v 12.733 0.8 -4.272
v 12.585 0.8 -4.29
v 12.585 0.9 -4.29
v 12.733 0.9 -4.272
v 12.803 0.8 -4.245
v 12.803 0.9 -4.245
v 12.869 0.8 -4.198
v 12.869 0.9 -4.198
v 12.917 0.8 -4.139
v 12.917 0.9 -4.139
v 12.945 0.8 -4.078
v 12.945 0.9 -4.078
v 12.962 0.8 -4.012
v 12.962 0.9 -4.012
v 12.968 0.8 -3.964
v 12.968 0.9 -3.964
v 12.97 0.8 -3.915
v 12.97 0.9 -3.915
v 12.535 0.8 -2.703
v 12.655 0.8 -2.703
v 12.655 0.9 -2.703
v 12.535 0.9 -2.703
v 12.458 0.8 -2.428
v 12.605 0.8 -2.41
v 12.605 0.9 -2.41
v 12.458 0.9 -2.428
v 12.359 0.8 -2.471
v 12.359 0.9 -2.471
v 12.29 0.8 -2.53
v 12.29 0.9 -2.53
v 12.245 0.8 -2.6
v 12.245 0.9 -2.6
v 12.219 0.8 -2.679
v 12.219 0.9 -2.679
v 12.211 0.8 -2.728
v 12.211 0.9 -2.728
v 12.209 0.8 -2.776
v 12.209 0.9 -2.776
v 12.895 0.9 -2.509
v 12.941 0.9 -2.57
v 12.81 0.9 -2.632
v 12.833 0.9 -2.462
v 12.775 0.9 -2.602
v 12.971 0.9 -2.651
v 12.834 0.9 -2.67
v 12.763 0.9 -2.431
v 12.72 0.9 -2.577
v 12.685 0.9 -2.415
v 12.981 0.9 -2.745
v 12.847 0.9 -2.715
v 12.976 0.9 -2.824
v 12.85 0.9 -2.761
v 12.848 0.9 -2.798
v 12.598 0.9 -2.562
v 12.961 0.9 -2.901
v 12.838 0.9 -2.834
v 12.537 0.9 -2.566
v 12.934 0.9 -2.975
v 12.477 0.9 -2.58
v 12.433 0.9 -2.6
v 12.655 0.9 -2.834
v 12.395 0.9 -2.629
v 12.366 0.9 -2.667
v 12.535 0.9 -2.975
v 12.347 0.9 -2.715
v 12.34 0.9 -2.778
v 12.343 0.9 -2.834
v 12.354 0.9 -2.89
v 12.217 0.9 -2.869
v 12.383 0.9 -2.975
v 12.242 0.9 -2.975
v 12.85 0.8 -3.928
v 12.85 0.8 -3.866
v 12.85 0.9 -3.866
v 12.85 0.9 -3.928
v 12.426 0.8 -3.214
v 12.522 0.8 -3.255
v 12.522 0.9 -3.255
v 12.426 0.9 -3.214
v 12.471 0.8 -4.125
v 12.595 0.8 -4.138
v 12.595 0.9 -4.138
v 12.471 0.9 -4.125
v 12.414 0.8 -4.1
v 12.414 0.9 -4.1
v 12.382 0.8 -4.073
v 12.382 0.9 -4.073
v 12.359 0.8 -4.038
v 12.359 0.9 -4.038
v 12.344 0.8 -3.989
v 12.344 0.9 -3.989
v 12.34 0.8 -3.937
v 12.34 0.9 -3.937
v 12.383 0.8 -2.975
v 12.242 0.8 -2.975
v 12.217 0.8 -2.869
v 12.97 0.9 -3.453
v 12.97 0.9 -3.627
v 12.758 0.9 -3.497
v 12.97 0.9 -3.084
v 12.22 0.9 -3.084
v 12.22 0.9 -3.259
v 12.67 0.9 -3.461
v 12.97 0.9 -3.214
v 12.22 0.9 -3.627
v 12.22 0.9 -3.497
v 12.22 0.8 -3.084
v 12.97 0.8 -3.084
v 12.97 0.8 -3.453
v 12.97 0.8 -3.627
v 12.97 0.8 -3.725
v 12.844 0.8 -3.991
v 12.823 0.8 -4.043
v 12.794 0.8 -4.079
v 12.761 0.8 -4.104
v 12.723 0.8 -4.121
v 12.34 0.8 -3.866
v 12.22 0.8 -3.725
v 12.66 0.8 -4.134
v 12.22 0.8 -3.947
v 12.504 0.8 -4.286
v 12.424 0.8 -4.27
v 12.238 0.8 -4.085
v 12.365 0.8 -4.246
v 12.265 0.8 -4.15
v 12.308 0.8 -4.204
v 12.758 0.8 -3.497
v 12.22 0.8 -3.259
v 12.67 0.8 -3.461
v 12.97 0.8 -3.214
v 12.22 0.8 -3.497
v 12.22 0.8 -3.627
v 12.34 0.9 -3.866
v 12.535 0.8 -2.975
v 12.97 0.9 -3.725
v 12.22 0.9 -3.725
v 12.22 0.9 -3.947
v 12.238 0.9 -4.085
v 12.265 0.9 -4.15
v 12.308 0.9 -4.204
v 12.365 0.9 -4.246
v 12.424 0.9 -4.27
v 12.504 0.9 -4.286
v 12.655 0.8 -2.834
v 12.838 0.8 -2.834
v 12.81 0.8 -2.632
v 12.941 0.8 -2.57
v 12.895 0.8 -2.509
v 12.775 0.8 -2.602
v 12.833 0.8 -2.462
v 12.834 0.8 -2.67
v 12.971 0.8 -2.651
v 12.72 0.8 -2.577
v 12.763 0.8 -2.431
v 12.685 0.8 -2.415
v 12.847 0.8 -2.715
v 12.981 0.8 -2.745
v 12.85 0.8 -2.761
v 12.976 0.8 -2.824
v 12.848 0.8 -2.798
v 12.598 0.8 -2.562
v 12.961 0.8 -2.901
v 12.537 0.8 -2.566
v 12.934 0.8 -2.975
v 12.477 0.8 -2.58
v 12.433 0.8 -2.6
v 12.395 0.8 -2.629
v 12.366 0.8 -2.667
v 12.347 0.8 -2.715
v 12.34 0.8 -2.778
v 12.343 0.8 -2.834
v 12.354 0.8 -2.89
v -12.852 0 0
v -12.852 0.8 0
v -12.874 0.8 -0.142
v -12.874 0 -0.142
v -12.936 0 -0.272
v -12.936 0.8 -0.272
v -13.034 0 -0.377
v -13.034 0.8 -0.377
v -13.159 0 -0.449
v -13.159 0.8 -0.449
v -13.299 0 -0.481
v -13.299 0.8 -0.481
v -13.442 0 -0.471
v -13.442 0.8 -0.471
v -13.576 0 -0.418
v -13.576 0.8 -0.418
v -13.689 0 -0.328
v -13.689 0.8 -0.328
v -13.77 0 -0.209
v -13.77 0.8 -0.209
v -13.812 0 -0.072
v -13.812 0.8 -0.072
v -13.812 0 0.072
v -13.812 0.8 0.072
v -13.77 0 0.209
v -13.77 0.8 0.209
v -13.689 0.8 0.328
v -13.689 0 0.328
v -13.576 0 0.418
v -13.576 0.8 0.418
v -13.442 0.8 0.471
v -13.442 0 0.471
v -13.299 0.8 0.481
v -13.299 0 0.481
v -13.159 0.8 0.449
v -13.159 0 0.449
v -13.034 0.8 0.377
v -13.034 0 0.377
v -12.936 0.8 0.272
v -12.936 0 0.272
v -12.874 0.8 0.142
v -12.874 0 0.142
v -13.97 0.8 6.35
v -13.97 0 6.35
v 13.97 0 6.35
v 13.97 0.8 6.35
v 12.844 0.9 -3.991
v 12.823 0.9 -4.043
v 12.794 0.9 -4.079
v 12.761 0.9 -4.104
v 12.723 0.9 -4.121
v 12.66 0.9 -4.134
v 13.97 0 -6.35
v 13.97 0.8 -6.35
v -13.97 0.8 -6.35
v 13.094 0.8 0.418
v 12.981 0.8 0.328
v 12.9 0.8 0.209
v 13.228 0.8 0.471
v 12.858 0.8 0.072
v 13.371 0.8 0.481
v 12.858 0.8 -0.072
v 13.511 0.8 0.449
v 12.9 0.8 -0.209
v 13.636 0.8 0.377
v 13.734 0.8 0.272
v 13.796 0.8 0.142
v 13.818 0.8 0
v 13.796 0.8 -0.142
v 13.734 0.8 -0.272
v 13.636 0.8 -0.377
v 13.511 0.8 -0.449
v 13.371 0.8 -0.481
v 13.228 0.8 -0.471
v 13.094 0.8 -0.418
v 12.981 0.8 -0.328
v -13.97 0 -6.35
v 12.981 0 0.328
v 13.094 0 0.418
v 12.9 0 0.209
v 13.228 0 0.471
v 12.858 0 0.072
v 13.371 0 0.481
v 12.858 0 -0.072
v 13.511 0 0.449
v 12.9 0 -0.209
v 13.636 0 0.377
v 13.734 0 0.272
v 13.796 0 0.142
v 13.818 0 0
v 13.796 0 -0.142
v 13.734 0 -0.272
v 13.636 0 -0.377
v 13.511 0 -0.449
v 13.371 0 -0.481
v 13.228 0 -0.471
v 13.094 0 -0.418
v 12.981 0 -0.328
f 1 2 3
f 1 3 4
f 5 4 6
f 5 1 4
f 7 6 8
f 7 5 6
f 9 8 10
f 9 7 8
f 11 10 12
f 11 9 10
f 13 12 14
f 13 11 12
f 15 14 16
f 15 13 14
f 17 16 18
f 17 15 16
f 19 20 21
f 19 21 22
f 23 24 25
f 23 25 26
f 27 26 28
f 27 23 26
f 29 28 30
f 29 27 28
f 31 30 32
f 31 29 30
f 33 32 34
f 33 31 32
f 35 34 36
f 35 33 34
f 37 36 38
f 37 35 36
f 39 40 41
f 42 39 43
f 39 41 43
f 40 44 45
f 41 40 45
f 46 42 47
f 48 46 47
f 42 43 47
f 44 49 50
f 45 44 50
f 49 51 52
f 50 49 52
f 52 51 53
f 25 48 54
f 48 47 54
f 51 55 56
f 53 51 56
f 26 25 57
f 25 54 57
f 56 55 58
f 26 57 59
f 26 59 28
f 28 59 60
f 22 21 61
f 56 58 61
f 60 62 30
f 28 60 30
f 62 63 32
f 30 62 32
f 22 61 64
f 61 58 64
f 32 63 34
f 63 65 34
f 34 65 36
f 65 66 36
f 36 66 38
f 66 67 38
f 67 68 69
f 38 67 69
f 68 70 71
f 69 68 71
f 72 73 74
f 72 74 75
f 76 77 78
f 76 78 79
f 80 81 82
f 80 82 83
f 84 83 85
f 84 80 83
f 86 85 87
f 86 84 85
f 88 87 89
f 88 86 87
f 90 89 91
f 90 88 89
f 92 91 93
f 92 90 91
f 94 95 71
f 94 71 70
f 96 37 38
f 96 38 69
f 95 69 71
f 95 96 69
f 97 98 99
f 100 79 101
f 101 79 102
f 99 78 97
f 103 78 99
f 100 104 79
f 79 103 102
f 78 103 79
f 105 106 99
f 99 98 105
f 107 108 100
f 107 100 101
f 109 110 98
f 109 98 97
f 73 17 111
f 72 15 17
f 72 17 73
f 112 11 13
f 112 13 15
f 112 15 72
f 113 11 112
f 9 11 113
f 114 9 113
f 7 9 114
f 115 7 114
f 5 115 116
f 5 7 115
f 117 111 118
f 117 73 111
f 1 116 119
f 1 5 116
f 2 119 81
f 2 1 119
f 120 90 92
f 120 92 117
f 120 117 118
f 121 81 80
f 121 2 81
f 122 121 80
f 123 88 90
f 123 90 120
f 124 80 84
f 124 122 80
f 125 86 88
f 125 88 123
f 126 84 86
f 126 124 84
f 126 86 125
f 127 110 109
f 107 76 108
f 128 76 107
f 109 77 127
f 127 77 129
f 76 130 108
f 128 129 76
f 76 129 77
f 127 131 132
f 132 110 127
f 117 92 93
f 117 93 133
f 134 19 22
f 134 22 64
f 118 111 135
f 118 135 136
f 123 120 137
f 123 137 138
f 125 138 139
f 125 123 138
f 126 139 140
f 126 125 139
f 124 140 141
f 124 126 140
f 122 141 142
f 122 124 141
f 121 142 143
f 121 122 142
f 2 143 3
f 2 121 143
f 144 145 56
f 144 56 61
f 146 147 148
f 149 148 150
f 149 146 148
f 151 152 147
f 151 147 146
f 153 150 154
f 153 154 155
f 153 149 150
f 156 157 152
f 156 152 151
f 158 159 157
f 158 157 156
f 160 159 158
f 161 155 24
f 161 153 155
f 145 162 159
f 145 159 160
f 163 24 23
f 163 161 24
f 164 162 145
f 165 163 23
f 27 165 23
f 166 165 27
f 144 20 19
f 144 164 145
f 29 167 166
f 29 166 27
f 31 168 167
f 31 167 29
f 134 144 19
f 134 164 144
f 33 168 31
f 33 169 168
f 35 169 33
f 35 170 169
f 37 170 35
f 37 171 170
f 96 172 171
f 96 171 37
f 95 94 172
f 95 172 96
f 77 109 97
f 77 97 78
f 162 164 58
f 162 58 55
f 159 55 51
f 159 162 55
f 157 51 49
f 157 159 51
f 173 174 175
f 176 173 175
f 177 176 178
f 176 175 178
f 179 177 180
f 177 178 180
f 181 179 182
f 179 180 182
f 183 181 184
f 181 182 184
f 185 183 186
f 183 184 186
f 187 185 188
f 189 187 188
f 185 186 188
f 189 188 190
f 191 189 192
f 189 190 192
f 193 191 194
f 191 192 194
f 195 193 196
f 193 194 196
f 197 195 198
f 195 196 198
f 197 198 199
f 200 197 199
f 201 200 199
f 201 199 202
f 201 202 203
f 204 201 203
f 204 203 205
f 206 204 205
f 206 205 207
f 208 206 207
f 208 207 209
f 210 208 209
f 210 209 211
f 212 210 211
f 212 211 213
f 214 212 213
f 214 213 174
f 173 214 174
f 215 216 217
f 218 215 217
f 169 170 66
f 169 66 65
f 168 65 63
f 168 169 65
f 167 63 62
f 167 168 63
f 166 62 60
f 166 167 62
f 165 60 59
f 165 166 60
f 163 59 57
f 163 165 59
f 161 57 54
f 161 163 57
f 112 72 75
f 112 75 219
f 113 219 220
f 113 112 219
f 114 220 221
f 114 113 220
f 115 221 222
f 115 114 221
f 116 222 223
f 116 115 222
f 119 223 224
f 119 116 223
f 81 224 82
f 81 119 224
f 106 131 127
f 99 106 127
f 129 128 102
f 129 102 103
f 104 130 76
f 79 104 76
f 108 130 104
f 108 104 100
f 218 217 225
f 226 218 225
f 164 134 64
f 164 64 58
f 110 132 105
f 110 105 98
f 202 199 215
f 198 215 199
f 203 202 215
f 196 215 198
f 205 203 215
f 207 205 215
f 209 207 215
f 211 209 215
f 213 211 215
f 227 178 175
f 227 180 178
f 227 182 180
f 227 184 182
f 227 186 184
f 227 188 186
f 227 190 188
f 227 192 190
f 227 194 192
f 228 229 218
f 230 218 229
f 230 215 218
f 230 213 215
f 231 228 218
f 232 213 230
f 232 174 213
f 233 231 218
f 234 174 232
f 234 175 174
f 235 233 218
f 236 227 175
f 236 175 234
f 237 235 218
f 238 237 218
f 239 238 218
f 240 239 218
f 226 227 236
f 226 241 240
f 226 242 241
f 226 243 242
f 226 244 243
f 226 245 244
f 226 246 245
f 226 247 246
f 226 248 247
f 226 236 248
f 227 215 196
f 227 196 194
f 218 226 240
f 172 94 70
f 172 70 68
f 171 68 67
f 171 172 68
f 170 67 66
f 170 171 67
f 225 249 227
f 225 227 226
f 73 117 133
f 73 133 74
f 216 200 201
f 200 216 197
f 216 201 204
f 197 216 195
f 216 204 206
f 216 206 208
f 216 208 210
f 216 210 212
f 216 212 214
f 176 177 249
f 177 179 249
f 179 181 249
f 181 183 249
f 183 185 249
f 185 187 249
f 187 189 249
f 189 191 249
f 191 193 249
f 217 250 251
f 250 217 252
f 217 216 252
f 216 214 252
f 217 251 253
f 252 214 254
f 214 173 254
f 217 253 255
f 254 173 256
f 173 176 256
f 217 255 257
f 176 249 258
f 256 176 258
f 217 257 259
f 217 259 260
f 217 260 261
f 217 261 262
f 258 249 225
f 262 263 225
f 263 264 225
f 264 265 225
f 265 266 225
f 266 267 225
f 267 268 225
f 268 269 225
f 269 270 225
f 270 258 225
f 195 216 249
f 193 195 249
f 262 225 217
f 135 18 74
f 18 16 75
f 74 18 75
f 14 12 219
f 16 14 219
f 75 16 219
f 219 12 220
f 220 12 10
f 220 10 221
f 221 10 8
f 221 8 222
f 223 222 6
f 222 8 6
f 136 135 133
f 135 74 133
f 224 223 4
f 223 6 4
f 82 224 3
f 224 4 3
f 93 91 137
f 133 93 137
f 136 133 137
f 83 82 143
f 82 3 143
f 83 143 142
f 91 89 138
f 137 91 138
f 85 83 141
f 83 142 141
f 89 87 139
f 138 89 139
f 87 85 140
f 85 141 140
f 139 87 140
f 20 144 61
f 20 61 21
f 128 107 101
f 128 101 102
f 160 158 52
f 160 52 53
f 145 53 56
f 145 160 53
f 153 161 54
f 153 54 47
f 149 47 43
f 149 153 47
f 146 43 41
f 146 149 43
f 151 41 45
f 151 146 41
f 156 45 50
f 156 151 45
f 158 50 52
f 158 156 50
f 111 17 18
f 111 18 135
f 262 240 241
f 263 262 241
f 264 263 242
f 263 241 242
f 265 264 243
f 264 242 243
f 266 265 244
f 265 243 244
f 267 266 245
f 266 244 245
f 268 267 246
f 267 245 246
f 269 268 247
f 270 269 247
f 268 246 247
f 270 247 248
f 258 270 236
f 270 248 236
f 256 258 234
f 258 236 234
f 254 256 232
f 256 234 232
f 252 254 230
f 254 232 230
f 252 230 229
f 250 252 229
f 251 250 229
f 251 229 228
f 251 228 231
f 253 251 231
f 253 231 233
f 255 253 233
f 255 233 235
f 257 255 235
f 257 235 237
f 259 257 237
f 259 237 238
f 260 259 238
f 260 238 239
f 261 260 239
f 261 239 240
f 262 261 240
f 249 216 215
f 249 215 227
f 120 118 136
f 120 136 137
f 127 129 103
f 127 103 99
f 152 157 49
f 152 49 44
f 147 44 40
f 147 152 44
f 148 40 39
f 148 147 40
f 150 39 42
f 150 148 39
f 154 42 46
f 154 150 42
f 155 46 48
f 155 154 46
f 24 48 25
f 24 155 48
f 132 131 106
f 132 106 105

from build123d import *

# Parameters (mm, degrees)
SKETCH1_W             = 27.94
SKETCH1_H             = 12.7
BOSS_EXTRUDE1_DEPTH   = 0.8
BOSS_EXTRUDE3_DEPTH   = 0.1
BOSS_EXTRUDE3_2_DEPTH = 0.1
BOSS_EXTRUDE3_3_DEPTH = 0.1
SKETCH3_R             = 0.4826
CUT_EXTRUDE1_DEPTH    = 1.8


with BuildPart() as part:
    # Sketch1 → Boss-Extrude1 (new body)
    with BuildSketch(Plane(origin=(0, 0, 0), x_dir=(1, 0, 0), z_dir=(0, 1, 0))):
        Rectangle(SKETCH1_W, SKETCH1_H)
    extrude(amount=BOSS_EXTRUDE1_DEPTH)

    # Sketch3 → Cut-Extrude1 (cut, through all)
    with BuildSketch(Plane(origin=(0, 0.8, 0), x_dir=(1, 0, 0), z_dir=(0, 1, 0))):
        with Locations((-13.335, 0)):
            Circle(SKETCH3_R)
        with Locations((13.335, 0)):
            Circle(SKETCH3_R)
    extrude(amount=-CUT_EXTRUDE1_DEPTH, mode=Mode.SUBTRACT)


with BuildPart() as body_2:
    # Sketch2 → Boss-Extrude3 (new body)
    with BuildSketch(Plane(origin=(0, 0.8, 0), x_dir=(1, 0, 0), z_dir=(0, 1, 0))):
        with BuildLine():
            Line((12.654782609, 2.70326087), (12.535217391, 2.70326087))
            Line((12.535217391, 2.70326087), (12.535217391, 2.975))
            Line((12.535217391, 2.975), (12.933994565, 2.975))
            add(Edge.make_bspline(
                [(12.933994565, 2.975), (12.937837468, 2.966382306), (12.945532468, 2.949126304), (12.955152264, 2.922452152), (12.963165662, 2.895161446), (12.969582444, 2.867186739), (12.974756704, 2.838406753), (12.978239832, 2.808457977), (12.980539909, 2.777346131), (12.980758593, 2.756141049), (12.980869565, 2.745380435)],
                knots=[0, 0, 0, 0, 2.83e-05, 5.6667e-05, 8.4989e-05, 0.00011358, 0.000142731, 0.000172666, 0.000203994, 0.00023627, 0.00023627, 0.00023627, 0.00023627], degree=3))
            add(Edge.make_bspline(
                [(12.980869565, 2.745380435), (12.980575135, 2.732686426), (12.980000187, 2.70789819), (12.975544847, 2.671730082), (12.968102985, 2.637534066), (12.95758082, 2.605375869), (12.944174483, 2.57532413), (12.927751506, 2.547537374), (12.908296896, 2.522119124), (12.885871835, 2.499068556), (12.860656623, 2.478365329), (12.832343935, 2.460583289), (12.801398893, 2.444994305), (12.76754561, 2.432119366), (12.730828208, 2.422206945), (12.691431111, 2.414857144), (12.649210662, 2.41069843), (12.620144812, 2.410093731), (12.605190217, 2.409782609)],
                knots=[0, 0, 0, 0, 3.8074e-05, 7.4349e-05, 0.000109129, 0.000142911, 0.000175676, 0.000207657, 0.00023952, 0.000271469, 0.000303936, 0.000337152, 0.000371559, 0.000407737, 0.000445602, 0.000485509, 0.000527842, 0.000572705, 0.000572705, 0.000572705, 0.000572705], degree=3))
            add(Edge.make_bspline(
                [(12.605190217, 2.409782609), (12.590119329, 2.410063379), (12.560640948, 2.410612562), (12.517649028, 2.415264178), (12.477015917, 2.422834197), (12.438924245, 2.433501081), (12.40340077, 2.447069567), (12.37066987, 2.46356367), (12.340664417, 2.482851666), (12.313555861, 2.505027053), (12.289303043, 2.52985676), (12.268264698, 2.557527053), (12.250159996, 2.587749777), (12.235215685, 2.620684853), (12.223466349, 2.656149359), (12.215286825, 2.694073788), (12.210026575, 2.734307056), (12.209434125, 2.761950748), (12.209130435, 2.776120924)],
                knots=[0, 0, 0, 0, 4.5202e-05, 8.8415e-05, 0.000129553, 0.000169072, 0.000206921, 0.000243455, 0.000278834, 0.000313715, 0.000348305, 0.000382716, 0.000417755, 0.00045378, 0.000490999, 0.000529611, 0.000570015, 0.000612508, 0.000612508, 0.000612508, 0.000612508], degree=3))
            add(Edge.make_bspline(
                [(12.209130435, 2.776120924), (12.209532218, 2.793129262), (12.210329498, 2.826879873), (12.217434247, 2.876980037), (12.227746501, 2.9263664), (12.237062955, 2.958747212), (12.24173913, 2.975)],
                knots=[0, 0, 0, 0, 5.0999e-05, 0.0001012, 0.000151531, 0.00020225, 0.00020225, 0.00020225, 0.00020225], degree=3))
            Line((12.24173913, 2.975), (12.383043478, 2.975))
            add(Edge.make_bspline(
                [(12.383043478, 2.975), (12.379980993, 2.967778877), (12.373743753, 2.95307191), (12.365423125, 2.930202926), (12.358221837, 2.906110152), (12.351502266, 2.881255283), (12.346362637, 2.855715347), (12.342297504, 2.829954064), (12.340157423, 2.804010513), (12.339762417, 2.786654064), (12.339565217, 2.77798913)],
                knots=[0, 0, 0, 0, 2.3529e-05, 4.7921e-05, 7.2956e-05, 9.895e-05, 0.000125131, 0.000151072, 0.00017715, 0.000203149, 0.000203149, 0.000203149, 0.000203149], degree=3))
            add(Edge.make_bspline(
                [(12.339565217, 2.77798913), (12.339815286, 2.769432119), (12.34030236, 2.752765113), (12.343447714, 2.728538157), (12.349147142, 2.705902276), (12.356858098, 2.684749584), (12.367016557, 2.665384213), (12.378769875, 2.647446257), (12.392613504, 2.631346948), (12.408172988, 2.616681988), (12.425858915, 2.603987462), (12.445316436, 2.592660553), (12.466779836, 2.583250077), (12.490023007, 2.575418095), (12.514911387, 2.56933739), (12.541452876, 2.565226831), (12.569405263, 2.562357784), (12.588595139, 2.562092183), (12.598396739, 2.561956522)],
                knots=[0, 0, 0, 0, 2.5673e-05, 5.0005e-05, 7.3113e-05, 9.5575e-05, 0.000117376, 0.000138573, 0.000159776, 0.000180925, 0.000202564, 0.000224936, 0.000248354, 0.000272737, 0.000298441, 0.000325106, 0.000353261, 0.000382655, 0.000382655, 0.000382655, 0.000382655], degree=3))
            add(Edge.make_bspline(
                [(12.598396739, 2.561956522), (12.607855646, 2.562075031), (12.62634336, 2.56230666), (12.653314568, 2.564455477), (12.67893141, 2.567512732), (12.703015522, 2.572359742), (12.725710718, 2.578197941), (12.74645669, 2.586384894), (12.76574066, 2.595605891), (12.783117438, 2.606880689), (12.798645399, 2.619807192), (12.812297347, 2.634428016), (12.823846675, 2.65087516), (12.833678284, 2.669062622), (12.841293642, 2.689224243), (12.846708355, 2.71140086), (12.849932462, 2.735547695), (12.850263673, 2.752333528), (12.850434783, 2.761005435)],
                knots=[0, 0, 0, 0, 2.8371e-05, 5.5452e-05, 8.1131e-05, 0.000105712, 0.000129113, 0.000151318, 0.000172509, 0.000193143, 0.000213279, 0.000232988, 0.000252968, 0.000273408, 0.000294857, 0.00031743, 0.000341762, 0.000367767, 0.000367767, 0.000367767, 0.000367767], degree=3))
            add(Edge.make_bspline(
                [(12.850434783, 2.761005435), (12.850428671, 2.76502677), (12.850417297, 2.772510133), (12.84965684, 2.783099356), (12.848718815, 2.79264104), (12.847071406, 2.801443731), (12.845490001, 2.809753003), (12.843321763, 2.817657415), (12.840862664, 2.82554187), (12.839222527, 2.830920662), (12.838376359, 2.833695652)],
                knots=[0, 0, 0, 0, 1.206e-05, 2.2442e-05, 3.1838e-05, 4.0801e-05, 4.9295e-05, 5.7204e-05, 6.5371e-05, 7.4074e-05, 7.4074e-05, 7.4074e-05, 7.4074e-05], degree=3))
            Line((12.838376359, 2.833695652), (12.654782609, 2.833695652))
            Line((12.654782609, 2.833695652), (12.654782609, 2.70326087))
        make_face()
    extrude(amount=BOSS_EXTRUDE3_DEPTH)


with BuildPart() as body_3:
    # Sketch2 → Boss-Extrude3 2 (new body)
    with BuildSketch(Plane(origin=(0, 0.8, 0), x_dir=(1, 0, 0), z_dir=(0, 1, 0))):
        Polygon((12.97, 3.45326087), (12.52247962, 3.254891304), (12.426012228, 3.214130435), (12.736983696, 3.214130435), (12.97, 3.214130435), (12.97, 3.083695652), (12.22, 3.083695652), (12.22, 3.258967391), (12.670407609, 3.46107337), (12.758213315, 3.49673913), (12.427201087, 3.49673913), (12.22, 3.49673913), (12.22, 3.627173913), (12.97, 3.627173913), align=None)
    extrude(amount=BOSS_EXTRUDE3_2_DEPTH)


with BuildPart() as body_4:
    # Sketch2 → Boss-Extrude3 3 (new body)
    with BuildSketch(Plane(origin=(0, 0.8, 0), x_dir=(1, 0, 0), z_dir=(0, 1, 0))):
        with BuildLine():
            add(Edge.make_bspline(
                [(12.58548913, 4.290217391), (12.599710224, 4.289975652), (12.627533712, 4.289502692), (12.668263571, 4.285240593), (12.707047306, 4.278850222), (12.743677008, 4.269260397), (12.778055728, 4.25718027), (12.80998465, 4.242025479), (12.839124854, 4.223594949), (12.865678124, 4.20217252), (12.889688937, 4.177846254), (12.910460102, 4.149954132), (12.928585187, 4.119081437), (12.943495907, 4.084845598), (12.955426479, 4.047356907), (12.964029618, 4.00640729), (12.969102061, 3.961880726), (12.969693645, 3.931025897), (12.97, 3.915047554)],
                knots=[0, 0, 0, 0, 4.2651e-05, 8.3446e-05, 0.000122731, 0.000160464, 0.000196886, 0.000231905, 0.000266255, 0.000300073, 0.000334062, 0.000368505, 0.000404129, 0.000441239, 0.000480287, 0.000521958, 0.000566577, 0.000614501, 0.000614501, 0.000614501, 0.000614501], degree=3))
            Line((12.97, 3.915047554), (12.97, 3.725))
            Line((12.97, 3.725), (12.22, 3.725))
            Line((12.22, 3.725), (12.22, 3.946637228))
            add(Edge.make_bspline(
                [(12.22, 3.946637228), (12.220237689, 3.960518854), (12.220698643, 3.987439664), (12.224909749, 4.026487898), (12.231340527, 4.062888509), (12.240681124, 4.096654779), (12.25287599, 4.127737811), (12.26804846, 4.156160796), (12.286160399, 4.181864822), (12.307289513, 4.204852708), (12.331330057, 4.225177016), (12.358531463, 4.242568298), (12.388592407, 4.257411656), (12.421838105, 4.269386708), (12.458135011, 4.278956503), (12.497729156, 4.285327428), (12.540504801, 4.289532806), (12.570136214, 4.289983746), (12.58548913, 4.290217391)],
                knots=[0, 0, 0, 0, 4.1632e-05, 8.0738e-05, 0.000117682, 0.000152419, 0.00018566, 0.00021765, 0.000248844, 0.000279736, 0.000311072, 0.000343012, 0.000376356, 0.000411442, 0.000448846, 0.000488801, 0.000531625, 0.000577671, 0.000577671, 0.000577671, 0.000577671], degree=3))
        make_face()
        with BuildLine():
            add(Edge.make_bspline(
                [(12.594660326, 4.138043478), (12.584864589, 4.137886335), (12.565767958, 4.137579987), (12.537924462, 4.135979474), (12.511734986, 4.132904505), (12.487222162, 4.12869877), (12.464329042, 4.1233035), (12.443354505, 4.115691351), (12.42402882, 4.10678128), (12.40652124, 4.096024887), (12.390925185, 4.083410476), (12.37733451, 4.068760818), (12.365749837, 4.052184413), (12.356124233, 4.033583129), (12.348664549, 4.012791133), (12.343298257, 3.989776713), (12.340040163, 3.964393363), (12.33972816, 3.946704149), (12.339565217, 3.937466033)],
                knots=[0, 0, 0, 0, 2.939e-05, 5.7295e-05, 8.3628e-05, 0.00010845, 0.000131888, 0.000154074, 0.000175272, 0.000195633, 0.000215554, 0.000235262, 0.000255381, 0.000276043, 0.000297909, 0.000321473, 0.000346815, 0.000374517, 0.000374517, 0.000374517, 0.000374517], degree=3))
            Line((12.339565217, 3.937466033), (12.339565217, 3.866304348))
            Line((12.339565217, 3.866304348), (12.850434783, 3.866304348))
            Line((12.850434783, 3.866304348), (12.850434783, 3.927785326))
            add(Edge.make_bspline(
                [(12.850434783, 3.927785326), (12.850239672, 3.936116612), (12.849860166, 3.952321671), (12.846907915, 3.975848039), (12.842263839, 3.997905928), (12.835409562, 4.018383166), (12.826790511, 4.037346428), (12.816106699, 4.054729339), (12.803544216, 4.070569642), (12.788907206, 4.084791271), (12.772296576, 4.097556526), (12.753270496, 4.108275295), (12.732304426, 4.117765848), (12.708941442, 4.125085769), (12.683529028, 4.131080522), (12.655783654, 4.134976093), (12.625961423, 4.137610835), (12.60530974, 4.137896282), (12.594660326, 4.138043478)],
                knots=[0, 0, 0, 0, 2.4987e-05, 4.8601e-05, 7.1021e-05, 9.2503e-05, 0.00011325, 0.000133378, 0.000153563, 0.00017374, 0.00019446, 0.000216221, 0.000239105, 0.000263381, 0.000289541, 0.000317355, 0.000347355, 0.000379295, 0.000379295, 0.000379295, 0.000379295], degree=3))
        make_face(mode=Mode.SUBTRACT)
    extrude(amount=BOSS_EXTRUDE3_3_DEPTH)


solid = Compound([part.part, body_2.part, body_3.part, body_4.part])
